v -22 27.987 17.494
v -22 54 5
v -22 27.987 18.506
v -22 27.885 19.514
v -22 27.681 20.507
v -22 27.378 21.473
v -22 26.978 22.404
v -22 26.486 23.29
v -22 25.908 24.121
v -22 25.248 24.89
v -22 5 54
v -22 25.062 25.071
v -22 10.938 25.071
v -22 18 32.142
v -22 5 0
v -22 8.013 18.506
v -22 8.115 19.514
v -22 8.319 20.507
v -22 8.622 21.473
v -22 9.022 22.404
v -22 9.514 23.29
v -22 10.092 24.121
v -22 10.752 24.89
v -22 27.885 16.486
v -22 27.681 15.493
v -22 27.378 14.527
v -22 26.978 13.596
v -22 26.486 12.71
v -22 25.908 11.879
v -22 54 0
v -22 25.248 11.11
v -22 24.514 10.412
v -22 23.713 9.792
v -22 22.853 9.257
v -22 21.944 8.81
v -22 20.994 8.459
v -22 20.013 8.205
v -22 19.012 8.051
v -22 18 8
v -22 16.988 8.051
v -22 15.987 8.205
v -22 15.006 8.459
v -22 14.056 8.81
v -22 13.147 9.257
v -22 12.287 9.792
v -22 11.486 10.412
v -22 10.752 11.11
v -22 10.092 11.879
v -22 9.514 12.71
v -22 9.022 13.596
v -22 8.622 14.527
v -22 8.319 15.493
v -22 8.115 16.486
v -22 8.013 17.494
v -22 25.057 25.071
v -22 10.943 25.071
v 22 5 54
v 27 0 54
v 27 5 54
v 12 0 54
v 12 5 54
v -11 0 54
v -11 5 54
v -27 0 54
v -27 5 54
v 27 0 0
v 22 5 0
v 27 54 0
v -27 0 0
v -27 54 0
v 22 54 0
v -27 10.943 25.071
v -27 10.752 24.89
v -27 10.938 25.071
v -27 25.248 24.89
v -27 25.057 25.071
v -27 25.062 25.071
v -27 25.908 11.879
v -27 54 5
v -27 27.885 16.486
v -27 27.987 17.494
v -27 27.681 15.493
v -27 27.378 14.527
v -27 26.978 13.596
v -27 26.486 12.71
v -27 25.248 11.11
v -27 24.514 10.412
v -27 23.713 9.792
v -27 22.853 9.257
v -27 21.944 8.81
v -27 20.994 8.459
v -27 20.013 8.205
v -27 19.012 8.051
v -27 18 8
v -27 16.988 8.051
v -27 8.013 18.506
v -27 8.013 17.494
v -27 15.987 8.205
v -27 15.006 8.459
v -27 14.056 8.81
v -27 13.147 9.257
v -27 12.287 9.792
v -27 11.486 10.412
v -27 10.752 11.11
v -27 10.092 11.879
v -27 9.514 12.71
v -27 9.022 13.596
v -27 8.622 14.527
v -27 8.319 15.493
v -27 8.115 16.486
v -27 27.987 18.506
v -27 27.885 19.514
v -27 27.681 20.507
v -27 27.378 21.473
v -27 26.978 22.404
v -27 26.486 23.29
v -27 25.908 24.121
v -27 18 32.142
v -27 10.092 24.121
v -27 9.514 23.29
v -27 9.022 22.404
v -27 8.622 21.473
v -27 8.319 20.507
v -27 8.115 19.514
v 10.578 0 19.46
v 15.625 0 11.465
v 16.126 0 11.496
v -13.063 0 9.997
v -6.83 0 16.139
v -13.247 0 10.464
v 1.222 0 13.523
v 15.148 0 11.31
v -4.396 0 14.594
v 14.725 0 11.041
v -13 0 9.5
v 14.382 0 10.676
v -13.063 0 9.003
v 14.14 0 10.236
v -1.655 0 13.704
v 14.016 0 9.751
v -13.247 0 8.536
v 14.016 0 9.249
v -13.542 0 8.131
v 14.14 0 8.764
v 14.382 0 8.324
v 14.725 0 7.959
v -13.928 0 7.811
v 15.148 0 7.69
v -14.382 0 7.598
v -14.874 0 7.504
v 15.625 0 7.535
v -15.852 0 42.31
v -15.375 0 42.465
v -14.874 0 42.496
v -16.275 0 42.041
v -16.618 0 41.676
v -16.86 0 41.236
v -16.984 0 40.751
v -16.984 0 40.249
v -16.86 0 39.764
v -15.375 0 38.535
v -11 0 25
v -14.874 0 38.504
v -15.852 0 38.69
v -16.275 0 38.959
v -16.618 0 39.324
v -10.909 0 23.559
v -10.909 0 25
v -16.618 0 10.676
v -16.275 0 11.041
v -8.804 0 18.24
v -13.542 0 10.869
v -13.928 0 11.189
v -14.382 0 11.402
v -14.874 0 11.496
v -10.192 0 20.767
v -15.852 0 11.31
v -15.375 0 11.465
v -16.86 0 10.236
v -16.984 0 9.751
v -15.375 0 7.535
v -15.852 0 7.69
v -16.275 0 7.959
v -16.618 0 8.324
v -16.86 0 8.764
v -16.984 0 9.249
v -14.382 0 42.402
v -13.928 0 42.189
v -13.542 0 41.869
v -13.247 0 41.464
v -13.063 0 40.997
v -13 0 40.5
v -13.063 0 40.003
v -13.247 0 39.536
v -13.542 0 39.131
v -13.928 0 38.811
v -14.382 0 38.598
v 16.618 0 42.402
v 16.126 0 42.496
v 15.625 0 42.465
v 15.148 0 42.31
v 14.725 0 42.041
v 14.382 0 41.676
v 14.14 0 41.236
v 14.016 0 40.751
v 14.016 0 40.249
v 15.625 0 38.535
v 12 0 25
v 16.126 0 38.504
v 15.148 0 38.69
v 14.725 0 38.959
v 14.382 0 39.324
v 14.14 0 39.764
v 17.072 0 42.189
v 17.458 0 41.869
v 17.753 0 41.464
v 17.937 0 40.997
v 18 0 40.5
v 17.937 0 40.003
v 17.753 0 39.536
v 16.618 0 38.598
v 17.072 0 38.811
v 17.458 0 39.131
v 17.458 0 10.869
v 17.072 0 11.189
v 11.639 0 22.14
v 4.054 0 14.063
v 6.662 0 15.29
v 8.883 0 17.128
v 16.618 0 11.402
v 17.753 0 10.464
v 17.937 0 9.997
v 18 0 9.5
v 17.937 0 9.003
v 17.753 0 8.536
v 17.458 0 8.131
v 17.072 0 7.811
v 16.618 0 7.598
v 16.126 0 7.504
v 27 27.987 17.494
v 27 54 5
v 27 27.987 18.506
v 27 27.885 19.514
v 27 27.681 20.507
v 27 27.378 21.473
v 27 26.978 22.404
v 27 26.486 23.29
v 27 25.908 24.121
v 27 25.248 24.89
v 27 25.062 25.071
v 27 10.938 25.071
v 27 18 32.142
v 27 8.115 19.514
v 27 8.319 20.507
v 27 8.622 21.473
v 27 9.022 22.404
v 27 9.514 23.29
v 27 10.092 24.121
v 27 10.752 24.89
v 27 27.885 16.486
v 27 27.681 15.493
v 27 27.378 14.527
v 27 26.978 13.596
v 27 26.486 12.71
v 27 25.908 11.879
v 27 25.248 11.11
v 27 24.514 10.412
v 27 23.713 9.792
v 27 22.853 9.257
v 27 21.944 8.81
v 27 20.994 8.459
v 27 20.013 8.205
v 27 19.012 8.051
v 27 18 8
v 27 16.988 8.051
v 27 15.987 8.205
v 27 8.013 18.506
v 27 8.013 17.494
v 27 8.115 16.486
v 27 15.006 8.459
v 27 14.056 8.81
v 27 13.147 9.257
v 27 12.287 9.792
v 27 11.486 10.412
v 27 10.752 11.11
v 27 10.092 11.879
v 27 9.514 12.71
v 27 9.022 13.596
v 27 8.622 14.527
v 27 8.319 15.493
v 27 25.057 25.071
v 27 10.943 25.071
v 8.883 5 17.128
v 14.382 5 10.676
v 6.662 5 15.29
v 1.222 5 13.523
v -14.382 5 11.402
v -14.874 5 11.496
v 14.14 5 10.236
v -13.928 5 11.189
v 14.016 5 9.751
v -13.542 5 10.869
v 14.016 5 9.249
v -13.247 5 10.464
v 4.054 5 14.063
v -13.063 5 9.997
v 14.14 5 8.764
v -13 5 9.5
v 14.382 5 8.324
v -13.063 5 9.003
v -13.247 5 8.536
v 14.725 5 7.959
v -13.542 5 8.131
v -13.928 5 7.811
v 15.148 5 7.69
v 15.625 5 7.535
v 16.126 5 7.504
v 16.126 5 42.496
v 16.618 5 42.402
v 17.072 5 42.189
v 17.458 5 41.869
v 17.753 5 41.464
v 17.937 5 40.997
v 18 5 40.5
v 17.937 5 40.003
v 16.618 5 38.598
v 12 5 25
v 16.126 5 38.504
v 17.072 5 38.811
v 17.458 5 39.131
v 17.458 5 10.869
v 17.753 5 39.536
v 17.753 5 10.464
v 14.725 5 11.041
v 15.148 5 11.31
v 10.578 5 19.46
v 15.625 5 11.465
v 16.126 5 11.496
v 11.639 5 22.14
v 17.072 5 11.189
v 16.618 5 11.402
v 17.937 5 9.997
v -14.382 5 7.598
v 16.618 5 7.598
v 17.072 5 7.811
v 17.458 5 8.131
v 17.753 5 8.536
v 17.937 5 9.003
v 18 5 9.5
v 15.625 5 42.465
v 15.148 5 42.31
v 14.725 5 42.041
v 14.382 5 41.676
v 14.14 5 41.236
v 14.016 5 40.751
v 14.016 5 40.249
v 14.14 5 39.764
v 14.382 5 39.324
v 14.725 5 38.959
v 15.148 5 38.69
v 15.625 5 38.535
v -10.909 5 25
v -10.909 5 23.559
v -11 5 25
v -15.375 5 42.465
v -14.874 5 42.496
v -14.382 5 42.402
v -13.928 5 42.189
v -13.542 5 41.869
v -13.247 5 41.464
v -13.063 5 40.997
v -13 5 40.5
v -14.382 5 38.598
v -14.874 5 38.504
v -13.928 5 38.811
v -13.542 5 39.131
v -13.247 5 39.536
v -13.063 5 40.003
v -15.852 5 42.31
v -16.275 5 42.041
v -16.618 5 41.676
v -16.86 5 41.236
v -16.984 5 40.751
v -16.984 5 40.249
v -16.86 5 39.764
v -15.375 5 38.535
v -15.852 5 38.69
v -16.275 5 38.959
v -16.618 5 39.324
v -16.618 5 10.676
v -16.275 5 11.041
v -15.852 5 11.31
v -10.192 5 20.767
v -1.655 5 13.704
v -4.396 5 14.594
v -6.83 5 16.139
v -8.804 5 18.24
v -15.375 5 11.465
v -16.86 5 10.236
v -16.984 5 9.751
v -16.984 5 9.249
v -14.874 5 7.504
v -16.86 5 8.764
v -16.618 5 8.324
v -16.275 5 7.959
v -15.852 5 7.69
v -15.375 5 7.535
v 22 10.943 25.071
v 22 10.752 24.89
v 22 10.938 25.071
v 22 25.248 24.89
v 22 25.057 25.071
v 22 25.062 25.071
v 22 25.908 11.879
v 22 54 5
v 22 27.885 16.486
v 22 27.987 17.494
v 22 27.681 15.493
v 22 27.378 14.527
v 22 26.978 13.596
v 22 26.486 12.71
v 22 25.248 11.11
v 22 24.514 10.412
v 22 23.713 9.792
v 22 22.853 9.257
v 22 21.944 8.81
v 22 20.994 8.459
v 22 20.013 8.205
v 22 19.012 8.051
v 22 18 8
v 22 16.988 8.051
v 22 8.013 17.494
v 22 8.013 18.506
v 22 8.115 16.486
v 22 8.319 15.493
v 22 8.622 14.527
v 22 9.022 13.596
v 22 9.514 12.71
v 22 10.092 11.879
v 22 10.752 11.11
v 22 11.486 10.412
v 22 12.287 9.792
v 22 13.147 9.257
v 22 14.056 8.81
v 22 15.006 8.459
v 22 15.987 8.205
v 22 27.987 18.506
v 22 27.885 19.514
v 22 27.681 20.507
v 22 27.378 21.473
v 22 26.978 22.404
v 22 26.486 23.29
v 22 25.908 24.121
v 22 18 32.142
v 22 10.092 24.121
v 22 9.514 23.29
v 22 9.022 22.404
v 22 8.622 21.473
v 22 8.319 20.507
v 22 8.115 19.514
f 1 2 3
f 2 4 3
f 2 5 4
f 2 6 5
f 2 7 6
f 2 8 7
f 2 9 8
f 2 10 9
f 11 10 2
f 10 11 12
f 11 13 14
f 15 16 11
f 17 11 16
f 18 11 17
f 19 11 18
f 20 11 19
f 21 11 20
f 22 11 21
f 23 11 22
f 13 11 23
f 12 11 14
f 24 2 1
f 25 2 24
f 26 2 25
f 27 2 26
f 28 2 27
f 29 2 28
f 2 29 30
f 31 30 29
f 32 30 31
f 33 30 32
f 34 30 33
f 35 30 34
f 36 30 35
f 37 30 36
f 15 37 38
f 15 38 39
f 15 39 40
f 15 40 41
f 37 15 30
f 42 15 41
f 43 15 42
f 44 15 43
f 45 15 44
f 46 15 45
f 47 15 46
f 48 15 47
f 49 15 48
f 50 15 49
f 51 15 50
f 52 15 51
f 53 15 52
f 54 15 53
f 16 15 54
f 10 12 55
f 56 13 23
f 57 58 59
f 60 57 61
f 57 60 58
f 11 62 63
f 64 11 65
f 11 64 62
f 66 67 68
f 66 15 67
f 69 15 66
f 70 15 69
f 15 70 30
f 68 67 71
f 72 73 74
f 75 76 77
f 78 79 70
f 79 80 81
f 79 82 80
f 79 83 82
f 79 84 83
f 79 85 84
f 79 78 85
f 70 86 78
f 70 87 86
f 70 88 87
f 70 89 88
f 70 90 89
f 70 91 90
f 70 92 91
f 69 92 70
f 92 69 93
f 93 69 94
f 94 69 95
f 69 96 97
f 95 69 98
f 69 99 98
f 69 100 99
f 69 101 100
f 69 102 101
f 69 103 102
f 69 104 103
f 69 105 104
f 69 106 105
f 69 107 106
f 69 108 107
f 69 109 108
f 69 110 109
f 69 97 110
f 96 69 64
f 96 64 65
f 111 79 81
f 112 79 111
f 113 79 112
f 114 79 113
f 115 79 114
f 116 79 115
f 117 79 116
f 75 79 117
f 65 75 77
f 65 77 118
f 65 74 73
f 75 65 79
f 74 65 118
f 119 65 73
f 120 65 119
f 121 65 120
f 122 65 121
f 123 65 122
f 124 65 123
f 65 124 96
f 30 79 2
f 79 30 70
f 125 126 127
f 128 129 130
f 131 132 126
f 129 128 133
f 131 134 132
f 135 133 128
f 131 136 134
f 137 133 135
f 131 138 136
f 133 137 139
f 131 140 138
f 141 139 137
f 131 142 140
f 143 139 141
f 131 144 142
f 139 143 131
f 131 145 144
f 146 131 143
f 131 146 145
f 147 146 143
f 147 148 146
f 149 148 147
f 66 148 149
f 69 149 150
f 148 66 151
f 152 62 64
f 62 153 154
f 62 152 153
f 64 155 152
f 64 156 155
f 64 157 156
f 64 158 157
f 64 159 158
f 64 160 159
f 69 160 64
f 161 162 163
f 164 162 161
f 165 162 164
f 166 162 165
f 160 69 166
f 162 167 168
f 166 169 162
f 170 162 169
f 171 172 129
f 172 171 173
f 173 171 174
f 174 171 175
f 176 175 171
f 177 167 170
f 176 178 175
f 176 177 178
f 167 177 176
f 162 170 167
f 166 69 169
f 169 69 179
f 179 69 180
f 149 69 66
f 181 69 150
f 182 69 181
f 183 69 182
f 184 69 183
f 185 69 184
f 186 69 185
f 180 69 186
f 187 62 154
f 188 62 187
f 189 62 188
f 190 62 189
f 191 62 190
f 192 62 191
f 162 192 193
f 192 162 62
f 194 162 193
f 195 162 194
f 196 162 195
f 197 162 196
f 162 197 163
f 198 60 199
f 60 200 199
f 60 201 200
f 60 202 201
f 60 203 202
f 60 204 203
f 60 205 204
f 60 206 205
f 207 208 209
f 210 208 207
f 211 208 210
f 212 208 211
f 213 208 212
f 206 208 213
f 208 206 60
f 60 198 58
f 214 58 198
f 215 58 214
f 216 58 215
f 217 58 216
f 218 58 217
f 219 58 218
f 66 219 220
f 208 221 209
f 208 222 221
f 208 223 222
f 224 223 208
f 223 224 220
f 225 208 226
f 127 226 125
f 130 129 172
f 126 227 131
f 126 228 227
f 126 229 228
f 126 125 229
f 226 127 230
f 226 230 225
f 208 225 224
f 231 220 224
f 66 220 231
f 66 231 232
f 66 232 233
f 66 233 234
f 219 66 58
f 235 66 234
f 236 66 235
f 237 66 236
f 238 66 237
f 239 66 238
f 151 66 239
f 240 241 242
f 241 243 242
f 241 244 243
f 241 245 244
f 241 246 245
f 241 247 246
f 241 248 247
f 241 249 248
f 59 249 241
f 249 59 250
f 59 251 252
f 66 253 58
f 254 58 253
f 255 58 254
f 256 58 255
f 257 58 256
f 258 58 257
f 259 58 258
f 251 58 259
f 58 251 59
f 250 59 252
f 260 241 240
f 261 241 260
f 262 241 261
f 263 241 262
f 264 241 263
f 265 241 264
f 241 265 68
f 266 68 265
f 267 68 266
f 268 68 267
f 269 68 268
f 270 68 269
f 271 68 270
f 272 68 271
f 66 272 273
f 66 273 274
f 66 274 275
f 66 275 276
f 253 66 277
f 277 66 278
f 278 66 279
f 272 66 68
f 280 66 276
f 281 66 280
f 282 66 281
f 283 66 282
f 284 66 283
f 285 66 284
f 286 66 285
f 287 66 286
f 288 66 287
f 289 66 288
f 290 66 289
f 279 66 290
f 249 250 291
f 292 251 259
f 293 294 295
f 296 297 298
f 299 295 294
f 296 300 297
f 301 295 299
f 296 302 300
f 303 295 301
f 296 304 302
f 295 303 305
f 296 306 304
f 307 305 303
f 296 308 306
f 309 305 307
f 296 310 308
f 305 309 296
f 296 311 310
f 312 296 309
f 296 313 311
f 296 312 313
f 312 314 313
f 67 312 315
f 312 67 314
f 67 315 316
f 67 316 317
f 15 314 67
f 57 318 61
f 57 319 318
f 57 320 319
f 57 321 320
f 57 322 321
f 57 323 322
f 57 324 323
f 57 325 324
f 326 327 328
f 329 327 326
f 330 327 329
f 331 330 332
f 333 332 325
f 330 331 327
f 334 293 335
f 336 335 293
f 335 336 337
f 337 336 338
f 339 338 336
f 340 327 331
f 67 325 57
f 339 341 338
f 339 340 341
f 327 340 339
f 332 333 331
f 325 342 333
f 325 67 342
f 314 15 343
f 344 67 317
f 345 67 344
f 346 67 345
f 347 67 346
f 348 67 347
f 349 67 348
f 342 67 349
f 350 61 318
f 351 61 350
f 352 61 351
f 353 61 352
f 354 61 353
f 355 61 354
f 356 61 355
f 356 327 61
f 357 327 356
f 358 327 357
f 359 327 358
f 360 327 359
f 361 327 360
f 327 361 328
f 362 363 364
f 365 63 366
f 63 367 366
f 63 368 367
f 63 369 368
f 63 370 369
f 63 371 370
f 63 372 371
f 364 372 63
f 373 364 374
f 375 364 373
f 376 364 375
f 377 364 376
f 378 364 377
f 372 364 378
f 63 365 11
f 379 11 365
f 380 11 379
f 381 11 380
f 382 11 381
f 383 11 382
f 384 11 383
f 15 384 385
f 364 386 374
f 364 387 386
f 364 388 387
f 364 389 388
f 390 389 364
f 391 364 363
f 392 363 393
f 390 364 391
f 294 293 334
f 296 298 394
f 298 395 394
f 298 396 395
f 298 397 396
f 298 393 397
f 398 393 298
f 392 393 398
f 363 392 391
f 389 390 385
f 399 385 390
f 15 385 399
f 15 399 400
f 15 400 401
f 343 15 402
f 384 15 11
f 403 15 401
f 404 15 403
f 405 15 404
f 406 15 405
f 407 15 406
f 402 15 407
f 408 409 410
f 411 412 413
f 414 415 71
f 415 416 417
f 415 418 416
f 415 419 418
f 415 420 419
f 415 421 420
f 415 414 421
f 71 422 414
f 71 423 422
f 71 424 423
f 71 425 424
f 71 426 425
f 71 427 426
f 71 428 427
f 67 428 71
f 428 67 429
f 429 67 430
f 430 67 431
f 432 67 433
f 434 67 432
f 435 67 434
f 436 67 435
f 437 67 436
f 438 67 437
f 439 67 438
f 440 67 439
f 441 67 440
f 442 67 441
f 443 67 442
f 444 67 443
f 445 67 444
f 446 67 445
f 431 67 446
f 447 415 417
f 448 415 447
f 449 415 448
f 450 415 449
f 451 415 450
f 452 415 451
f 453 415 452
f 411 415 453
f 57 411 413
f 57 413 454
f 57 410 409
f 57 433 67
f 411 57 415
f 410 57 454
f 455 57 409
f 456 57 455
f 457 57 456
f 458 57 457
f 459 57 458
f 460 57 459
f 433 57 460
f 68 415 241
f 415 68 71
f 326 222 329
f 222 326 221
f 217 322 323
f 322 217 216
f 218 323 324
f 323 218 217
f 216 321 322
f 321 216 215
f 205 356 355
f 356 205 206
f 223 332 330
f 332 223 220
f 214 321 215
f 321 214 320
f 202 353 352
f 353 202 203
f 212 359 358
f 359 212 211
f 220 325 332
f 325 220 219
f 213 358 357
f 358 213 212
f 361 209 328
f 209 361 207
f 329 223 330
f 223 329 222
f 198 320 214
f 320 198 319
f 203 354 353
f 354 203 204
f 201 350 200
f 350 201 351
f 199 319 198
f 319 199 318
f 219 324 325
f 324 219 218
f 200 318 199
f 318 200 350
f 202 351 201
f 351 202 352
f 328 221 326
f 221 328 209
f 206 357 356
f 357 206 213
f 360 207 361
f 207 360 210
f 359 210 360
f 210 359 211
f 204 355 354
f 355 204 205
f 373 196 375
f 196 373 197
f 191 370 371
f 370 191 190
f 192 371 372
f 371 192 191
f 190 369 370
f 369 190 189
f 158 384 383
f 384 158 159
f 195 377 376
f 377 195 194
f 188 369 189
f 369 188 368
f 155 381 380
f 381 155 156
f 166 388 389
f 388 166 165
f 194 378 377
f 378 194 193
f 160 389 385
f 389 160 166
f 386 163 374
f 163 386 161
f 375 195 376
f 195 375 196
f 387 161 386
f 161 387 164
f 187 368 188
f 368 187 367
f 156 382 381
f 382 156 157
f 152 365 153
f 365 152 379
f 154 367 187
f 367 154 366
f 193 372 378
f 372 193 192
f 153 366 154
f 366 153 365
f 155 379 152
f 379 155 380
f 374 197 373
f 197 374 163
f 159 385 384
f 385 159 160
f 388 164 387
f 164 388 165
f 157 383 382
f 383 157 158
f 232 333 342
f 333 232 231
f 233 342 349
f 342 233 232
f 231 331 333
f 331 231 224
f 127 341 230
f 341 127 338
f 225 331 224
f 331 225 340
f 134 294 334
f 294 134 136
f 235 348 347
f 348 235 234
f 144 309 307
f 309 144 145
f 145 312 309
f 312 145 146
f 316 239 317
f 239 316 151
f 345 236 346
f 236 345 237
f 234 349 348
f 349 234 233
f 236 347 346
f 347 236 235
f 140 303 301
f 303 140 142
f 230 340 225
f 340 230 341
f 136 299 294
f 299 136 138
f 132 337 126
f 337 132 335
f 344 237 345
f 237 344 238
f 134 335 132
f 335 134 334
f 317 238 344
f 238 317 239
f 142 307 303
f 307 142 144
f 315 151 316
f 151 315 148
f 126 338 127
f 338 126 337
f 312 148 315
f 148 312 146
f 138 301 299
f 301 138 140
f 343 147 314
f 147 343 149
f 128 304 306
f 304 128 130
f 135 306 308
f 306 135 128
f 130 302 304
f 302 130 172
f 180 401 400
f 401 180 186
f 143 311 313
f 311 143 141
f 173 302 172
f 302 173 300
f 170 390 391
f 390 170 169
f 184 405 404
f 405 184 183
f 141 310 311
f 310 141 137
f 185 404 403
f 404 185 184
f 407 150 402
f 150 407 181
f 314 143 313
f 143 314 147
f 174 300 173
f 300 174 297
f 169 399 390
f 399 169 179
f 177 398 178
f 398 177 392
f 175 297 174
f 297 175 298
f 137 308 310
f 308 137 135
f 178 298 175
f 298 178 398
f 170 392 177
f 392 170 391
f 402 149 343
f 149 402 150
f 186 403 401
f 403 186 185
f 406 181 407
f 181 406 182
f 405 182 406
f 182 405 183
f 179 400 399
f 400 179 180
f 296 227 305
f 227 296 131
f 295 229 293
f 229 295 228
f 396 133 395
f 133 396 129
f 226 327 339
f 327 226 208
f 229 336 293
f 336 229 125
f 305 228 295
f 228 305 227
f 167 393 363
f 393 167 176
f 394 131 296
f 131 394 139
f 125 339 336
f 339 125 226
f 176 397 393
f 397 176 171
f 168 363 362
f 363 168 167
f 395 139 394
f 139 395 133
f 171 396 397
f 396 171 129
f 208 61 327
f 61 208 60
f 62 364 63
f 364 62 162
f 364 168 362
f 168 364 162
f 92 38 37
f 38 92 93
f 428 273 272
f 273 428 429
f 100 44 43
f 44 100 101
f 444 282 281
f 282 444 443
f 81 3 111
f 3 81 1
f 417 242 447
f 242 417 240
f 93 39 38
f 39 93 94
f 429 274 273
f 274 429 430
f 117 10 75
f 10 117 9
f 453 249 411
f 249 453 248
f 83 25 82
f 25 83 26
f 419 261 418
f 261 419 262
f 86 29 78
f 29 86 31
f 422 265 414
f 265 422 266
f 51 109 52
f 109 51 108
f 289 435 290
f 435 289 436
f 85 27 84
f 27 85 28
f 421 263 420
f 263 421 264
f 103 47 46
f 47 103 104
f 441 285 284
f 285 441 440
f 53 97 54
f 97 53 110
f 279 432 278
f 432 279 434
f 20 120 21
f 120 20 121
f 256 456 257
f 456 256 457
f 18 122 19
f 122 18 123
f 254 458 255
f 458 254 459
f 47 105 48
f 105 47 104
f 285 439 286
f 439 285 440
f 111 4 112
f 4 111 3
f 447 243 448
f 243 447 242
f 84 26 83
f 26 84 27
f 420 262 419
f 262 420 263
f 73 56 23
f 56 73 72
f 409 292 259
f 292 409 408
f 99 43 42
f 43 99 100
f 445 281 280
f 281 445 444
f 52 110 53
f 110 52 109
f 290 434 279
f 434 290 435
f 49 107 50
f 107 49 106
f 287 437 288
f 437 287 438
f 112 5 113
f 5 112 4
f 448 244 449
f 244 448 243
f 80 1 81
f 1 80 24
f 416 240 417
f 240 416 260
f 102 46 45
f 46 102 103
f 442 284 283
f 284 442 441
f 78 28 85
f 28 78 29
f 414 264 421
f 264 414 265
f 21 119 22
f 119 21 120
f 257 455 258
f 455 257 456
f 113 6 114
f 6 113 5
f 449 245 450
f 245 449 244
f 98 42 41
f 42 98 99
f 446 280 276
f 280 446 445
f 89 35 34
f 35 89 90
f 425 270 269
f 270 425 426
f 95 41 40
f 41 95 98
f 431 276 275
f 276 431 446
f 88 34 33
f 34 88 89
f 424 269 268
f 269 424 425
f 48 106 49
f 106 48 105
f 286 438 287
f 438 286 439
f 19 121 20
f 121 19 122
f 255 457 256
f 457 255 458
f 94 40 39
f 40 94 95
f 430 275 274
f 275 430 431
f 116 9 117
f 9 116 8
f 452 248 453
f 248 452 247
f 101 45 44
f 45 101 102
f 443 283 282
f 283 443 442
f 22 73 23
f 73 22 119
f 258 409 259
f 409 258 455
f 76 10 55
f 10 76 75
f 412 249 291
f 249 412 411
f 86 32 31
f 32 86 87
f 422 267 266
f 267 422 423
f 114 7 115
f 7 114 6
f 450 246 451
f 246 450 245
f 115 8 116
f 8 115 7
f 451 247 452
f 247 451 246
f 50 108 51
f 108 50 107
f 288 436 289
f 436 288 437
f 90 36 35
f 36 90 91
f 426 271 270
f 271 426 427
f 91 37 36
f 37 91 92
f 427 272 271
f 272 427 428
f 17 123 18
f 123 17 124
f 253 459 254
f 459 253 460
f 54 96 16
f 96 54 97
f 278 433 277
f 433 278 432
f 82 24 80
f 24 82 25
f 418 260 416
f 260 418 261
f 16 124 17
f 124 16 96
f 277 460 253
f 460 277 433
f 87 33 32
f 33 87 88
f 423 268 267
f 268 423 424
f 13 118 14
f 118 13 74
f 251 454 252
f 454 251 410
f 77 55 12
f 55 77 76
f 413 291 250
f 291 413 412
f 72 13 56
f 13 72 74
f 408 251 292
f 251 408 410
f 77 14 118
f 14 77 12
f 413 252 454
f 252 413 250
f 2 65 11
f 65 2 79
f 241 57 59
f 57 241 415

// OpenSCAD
include <Libs.scad>
libEcho = false;

nema_17_mount();

module nema_17_mount(support_height = 54, td = true, td_rotate = 0)
{
	$fs = 0.1;

	wall_thickness = 5;
	motor_width = 42;
	frame_width = motor_width + (wall_thickness + 1)*2;
	bolt = 4;
	height = 25;
	
	//these are all the mount point holes.
	x1 = -wall_thickness;
	y1 = wall_thickness*2;
	x2 = frame_width+wall_thickness;
	y2 = wall_thickness*2;
	x3 = -wall_thickness;
	y3 = frame_width-wall_thickness*2;
	x4 = frame_width + wall_thickness;
	y4 = frame_width-wall_thickness*2;
	
	//center the whole thing in X
	translate([-frame_width/2, 0, 0])
	{
		difference()
		{
			//build the main unit.
			union()
			{
				//structure
				cube([wall_thickness, support_height, frame_width]); //front face
				cube([frame_width, wall_thickness, frame_width]); //left face
				translate([frame_width-wall_thickness, 0, 0])     //right face
					cube([wall_thickness, support_height, frame_width]);
			}

			//nema 17 mount
			rotate([90, 0, 0])
			{
				translate([frame_width/2+0.5, height, -wall_thickness])
				{
					translate([15.5, 15.5, -0.5])
						cylinder(r=bolt/2, h=wall_thickness+1);
					translate([-15.5, 15.5, -0.5])
						cylinder(r=bolt/2, h=wall_thickness+1);
					translate([15.5, -15.5, -0.5])
						cylinder(r=bolt/2, h=wall_thickness+1);
					translate([-15.5, -15.5, -0.5])
						cylinder(r=bolt/2, h=wall_thickness+1);
					translate([0, 0, -0.5])
						cylinder(r=11.5, h=wall_thickness+1);
					translate([-11.5, 0, -0.5])
						cube([23, frame_width, wall_thickness+1]);
				}
			}

			//back slant cutaway
			translate([0, 0, frame_width+wall_thickness])
				rotate([45, 0, 0])
					translate([-frame_width, 0, -frame_width*2])
						cube(size=[frame_width*4, frame_width*2, frame_width*4]);

			// teardrop hole
			if (td){
				translate([25, (1/3) * frame_width, (1/3) * frame_width])
					rotate([td_rotate, 0, 0])
						teardrop(radius=10,  length = 100, angle=90);
			}
			
		}
	}
}
